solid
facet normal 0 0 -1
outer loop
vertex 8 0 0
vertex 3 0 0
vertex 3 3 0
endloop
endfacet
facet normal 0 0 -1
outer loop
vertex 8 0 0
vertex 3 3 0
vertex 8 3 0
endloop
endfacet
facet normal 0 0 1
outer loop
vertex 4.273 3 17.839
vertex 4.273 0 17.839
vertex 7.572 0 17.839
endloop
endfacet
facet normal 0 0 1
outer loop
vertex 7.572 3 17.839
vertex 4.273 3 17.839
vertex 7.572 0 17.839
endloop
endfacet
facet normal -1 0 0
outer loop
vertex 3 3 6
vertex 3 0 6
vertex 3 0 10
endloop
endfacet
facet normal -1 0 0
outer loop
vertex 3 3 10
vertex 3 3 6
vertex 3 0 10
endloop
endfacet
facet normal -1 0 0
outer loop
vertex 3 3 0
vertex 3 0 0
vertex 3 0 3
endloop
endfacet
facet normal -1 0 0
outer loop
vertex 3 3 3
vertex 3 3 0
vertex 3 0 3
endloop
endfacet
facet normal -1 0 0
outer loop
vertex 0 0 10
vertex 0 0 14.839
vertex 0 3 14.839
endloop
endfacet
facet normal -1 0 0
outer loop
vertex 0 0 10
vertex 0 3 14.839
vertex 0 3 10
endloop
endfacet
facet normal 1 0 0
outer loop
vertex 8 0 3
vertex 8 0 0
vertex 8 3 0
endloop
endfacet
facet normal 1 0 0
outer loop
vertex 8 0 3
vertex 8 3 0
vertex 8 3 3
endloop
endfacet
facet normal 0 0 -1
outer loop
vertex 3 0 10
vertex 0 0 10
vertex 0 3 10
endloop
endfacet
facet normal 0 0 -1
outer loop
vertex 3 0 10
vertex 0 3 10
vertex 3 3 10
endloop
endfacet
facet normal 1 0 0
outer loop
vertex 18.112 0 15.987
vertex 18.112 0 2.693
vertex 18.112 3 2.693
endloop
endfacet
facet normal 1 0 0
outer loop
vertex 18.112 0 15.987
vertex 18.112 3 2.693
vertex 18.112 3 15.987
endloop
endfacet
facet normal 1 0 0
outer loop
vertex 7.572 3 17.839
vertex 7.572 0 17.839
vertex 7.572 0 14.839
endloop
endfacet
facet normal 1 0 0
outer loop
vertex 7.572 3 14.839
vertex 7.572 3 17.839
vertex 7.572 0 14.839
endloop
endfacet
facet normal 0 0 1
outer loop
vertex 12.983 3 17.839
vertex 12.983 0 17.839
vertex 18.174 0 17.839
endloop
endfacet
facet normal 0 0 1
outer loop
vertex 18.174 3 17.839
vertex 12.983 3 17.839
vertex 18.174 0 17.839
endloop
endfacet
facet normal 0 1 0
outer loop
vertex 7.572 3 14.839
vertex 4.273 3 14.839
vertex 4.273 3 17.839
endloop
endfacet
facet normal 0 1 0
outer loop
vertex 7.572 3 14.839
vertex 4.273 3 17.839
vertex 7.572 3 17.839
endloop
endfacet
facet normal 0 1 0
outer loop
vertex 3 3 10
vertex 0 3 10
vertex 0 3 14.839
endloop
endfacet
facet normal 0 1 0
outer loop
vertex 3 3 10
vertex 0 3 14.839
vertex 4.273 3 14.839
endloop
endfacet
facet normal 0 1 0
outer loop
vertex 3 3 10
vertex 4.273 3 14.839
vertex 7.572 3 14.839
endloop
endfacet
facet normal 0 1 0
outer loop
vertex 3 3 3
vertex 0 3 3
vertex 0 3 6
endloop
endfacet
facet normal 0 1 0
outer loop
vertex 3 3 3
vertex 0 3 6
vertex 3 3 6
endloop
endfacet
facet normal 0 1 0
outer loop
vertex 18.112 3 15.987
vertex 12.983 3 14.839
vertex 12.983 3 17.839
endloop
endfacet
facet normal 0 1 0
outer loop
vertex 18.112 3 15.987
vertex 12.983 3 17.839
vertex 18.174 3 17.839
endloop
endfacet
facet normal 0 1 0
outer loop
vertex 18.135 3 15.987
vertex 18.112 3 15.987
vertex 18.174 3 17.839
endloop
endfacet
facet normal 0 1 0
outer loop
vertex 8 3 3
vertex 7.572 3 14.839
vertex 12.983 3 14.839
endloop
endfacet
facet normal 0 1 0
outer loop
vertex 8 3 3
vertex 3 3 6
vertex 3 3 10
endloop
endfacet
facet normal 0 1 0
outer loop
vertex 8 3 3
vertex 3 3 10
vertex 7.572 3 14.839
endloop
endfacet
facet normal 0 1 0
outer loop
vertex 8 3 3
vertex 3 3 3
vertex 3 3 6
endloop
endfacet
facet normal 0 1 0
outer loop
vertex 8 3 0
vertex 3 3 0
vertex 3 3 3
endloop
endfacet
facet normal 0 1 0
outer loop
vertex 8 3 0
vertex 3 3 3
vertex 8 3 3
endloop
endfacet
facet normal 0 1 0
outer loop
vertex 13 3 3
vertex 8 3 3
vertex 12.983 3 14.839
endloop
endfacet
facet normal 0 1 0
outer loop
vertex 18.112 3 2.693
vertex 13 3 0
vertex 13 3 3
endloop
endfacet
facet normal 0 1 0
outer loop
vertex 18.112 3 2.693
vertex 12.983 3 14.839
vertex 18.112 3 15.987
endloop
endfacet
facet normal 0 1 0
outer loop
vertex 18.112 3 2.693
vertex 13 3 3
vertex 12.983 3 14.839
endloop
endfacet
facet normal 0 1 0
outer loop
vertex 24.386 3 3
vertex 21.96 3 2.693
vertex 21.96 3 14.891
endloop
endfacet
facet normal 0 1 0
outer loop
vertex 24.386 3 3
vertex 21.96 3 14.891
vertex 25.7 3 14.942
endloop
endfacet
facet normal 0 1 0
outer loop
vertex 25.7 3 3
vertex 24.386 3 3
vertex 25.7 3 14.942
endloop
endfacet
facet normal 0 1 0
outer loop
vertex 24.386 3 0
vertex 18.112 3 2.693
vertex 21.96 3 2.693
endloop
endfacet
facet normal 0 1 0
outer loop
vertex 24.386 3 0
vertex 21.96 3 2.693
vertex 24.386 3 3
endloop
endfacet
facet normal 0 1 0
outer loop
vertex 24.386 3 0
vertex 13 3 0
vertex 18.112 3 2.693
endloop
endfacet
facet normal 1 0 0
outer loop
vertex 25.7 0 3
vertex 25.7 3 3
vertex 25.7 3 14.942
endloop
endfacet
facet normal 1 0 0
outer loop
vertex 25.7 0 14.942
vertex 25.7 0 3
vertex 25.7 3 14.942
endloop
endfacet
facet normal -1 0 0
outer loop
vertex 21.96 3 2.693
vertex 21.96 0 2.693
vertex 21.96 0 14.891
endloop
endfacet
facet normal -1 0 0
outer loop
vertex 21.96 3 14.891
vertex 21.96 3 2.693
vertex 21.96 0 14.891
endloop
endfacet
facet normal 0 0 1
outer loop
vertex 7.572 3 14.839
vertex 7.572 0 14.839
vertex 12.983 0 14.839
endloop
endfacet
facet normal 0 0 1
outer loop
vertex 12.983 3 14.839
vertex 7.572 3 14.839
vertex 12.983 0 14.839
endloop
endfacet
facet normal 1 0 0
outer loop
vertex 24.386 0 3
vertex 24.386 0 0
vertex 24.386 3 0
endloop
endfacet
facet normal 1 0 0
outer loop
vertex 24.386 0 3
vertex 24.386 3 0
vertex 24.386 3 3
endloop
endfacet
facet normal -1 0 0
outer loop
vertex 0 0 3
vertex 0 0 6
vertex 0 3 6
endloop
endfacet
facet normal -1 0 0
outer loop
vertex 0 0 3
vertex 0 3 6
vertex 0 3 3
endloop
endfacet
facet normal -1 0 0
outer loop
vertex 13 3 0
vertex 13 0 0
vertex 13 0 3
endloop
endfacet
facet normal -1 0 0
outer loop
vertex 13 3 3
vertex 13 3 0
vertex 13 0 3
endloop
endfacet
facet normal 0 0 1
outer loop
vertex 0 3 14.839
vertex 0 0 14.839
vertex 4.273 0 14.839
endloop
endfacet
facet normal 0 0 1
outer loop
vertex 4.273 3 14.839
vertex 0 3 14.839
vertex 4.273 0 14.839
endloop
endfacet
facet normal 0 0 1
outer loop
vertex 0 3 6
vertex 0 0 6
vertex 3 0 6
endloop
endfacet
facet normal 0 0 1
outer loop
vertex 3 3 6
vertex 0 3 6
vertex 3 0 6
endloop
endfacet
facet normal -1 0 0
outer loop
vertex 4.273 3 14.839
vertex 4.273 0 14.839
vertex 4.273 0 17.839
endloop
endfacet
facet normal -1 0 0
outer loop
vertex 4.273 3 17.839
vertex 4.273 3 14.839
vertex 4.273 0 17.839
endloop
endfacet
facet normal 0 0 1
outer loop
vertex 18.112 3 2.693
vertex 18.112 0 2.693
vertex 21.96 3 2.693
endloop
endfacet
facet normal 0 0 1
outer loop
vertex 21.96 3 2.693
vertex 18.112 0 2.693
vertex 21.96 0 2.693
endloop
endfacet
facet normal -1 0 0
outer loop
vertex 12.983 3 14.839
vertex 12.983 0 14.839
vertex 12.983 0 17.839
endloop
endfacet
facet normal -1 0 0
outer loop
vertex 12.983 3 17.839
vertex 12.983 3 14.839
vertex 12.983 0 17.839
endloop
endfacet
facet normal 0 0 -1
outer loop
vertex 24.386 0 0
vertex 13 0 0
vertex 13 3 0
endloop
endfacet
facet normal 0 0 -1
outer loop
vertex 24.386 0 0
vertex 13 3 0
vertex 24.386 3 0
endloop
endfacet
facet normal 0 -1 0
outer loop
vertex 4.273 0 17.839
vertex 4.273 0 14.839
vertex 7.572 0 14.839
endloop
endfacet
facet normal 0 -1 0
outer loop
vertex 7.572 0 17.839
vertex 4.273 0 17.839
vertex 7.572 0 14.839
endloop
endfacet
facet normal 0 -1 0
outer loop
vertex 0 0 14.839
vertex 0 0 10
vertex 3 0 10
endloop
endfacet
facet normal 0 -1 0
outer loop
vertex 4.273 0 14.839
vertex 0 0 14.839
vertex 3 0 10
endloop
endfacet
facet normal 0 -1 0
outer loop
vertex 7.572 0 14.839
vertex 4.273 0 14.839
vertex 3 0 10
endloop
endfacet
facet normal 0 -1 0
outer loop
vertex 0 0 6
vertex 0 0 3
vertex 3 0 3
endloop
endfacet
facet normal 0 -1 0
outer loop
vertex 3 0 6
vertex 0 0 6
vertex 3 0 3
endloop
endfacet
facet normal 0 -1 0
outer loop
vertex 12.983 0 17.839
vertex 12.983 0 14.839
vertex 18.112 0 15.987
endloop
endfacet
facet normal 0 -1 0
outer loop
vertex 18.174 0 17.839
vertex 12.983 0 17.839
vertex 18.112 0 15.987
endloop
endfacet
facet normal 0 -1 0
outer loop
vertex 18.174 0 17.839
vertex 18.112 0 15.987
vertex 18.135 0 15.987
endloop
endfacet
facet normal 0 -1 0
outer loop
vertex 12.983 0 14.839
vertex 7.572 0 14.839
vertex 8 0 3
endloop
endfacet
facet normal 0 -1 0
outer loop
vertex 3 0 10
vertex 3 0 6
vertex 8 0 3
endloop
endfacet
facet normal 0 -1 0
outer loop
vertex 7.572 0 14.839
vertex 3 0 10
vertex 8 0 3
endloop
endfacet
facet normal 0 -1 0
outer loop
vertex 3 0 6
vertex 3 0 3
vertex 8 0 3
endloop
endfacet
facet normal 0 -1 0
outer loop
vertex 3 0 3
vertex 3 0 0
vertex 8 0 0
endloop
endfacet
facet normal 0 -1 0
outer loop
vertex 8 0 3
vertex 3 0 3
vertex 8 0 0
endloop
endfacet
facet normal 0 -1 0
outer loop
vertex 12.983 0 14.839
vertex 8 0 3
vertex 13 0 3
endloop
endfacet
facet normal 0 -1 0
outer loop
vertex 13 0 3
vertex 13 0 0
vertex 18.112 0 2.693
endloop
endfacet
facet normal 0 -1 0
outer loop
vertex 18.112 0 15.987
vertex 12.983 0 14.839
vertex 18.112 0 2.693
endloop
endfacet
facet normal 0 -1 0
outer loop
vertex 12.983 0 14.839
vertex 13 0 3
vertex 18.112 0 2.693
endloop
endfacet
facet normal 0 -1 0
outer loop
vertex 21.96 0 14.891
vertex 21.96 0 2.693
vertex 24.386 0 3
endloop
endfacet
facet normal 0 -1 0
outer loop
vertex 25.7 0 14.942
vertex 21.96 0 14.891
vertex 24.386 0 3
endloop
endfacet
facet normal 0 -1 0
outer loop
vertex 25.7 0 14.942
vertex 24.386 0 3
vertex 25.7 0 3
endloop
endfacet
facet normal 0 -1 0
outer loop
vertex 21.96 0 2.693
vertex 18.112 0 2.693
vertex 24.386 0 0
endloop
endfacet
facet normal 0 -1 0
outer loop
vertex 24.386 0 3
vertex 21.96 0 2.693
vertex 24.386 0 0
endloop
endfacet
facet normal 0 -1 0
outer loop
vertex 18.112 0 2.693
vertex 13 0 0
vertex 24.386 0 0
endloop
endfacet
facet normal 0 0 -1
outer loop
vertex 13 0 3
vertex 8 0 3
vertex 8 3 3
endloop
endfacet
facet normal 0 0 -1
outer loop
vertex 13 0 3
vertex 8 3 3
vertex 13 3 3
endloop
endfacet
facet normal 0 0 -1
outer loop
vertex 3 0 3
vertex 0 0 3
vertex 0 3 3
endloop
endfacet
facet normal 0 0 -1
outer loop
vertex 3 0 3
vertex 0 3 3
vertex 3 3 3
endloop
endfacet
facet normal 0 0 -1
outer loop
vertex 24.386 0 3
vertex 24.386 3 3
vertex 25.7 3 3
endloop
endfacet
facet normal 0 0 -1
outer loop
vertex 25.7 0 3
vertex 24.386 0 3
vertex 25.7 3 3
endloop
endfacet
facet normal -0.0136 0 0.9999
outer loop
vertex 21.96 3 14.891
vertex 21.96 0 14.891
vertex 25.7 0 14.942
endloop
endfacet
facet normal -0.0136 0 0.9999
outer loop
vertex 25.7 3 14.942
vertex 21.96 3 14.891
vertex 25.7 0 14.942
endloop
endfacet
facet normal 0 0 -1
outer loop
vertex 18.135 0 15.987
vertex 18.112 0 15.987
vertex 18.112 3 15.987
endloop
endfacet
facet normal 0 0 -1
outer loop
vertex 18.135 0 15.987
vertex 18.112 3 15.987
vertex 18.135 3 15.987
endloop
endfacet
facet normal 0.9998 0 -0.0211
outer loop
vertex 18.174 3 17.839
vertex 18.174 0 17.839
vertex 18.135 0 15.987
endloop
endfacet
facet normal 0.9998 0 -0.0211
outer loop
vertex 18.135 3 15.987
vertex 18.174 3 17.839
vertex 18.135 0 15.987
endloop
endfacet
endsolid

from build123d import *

# Parameters (mm, degrees)
SKETCH1_W           = 30
SKETCH1_H           = 30
BOSS_EXTRUDE1_DEPTH = 3
SKETCH2_W           = 5
SKETCH2_H           = 3
SKETCH2_W_2         = 1.313790547
SKETCH2_W_3         = 3
SKETCH2_H_2         = 4
CUT_EXTRUDE1_DEPTH  = 3
SKETCH3_W           = 3.847981768
SKETCH3_H           = 13.294575909
CUT_EXTRUDE2_DEPTH  = 3
CUT_EXTRUDE3_DEPTH  = 3
CUT_EXTRUDE4_DEPTH  = 10


with BuildPart() as part:
    # Sketch1 → Boss-Extrude1 (new body)
    with BuildSketch(Plane(origin=(0, 0, 0), x_dir=(1, 0, 0), z_dir=(0, 1, 0))):
        with Locations((15, -15)):
            Rectangle(SKETCH1_W, SKETCH1_H)
    extrude(amount=BOSS_EXTRUDE1_DEPTH)

    # Sketch2 → Cut-Extrude1 (cut)
    with BuildSketch(Plane.XZ):
        with Locations((10.5, 1.5)):
            Rectangle(SKETCH2_W, SKETCH2_H)
        with Locations((25.043104727, 1.5)):
            Rectangle(SKETCH2_W_2, SKETCH2_H)
        with Locations((1.5, 1.5)):
            Rectangle(SKETCH2_W_3, SKETCH2_H)
        with Locations((1.5, 8)):
            Rectangle(SKETCH2_W_3, SKETCH2_H_2)
    extrude(amount=-CUT_EXTRUDE1_DEPTH, mode=Mode.SUBTRACT)

    # Sketch3 → Cut-Extrude2 (cut)
    with BuildSketch(Plane.XZ):
        with Locations((20.035652011, 9.340199914)):
            Rectangle(SKETCH3_W, SKETCH3_H)
    extrude(amount=-CUT_EXTRUDE2_DEPTH, mode=Mode.SUBTRACT)

    # Sketch4 → Cut-Extrude3 (cut)
    with BuildSketch(Plane.XZ):
        Polygon((0, 14.83898954), (4.273286448, 14.83898954), (4.273286448, 17.83898954), (7.572046642, 17.83898954), (7.572046642, 14.83898954), (12.983097177, 14.83898954), (12.983097177, 17.83898954), (18.173549861, 17.83898954), (18.111661127, 14.83898954), (30, 15), (30, 36.64216365), (-3.662569557, 36.64216365), (-3.662569557, 14.83898954), align=None)
    extrude(amount=-CUT_EXTRUDE3_DEPTH, mode=Mode.SUBTRACT)

    # Sketch6 → Cut-Extrude4 (cut)
    with BuildSketch(Plane(origin=(0, 3, 0), x_dir=(1, 0, 0), z_dir=(0, 1, 0))):
        Polygon((25.7, 0), (25.7, -20.065163227), (34.530029549, -19.489635477), (33.156944601, 1.576908509), (28.640882237, 2.839466423), align=None)
    extrude(amount=-CUT_EXTRUDE4_DEPTH, mode=Mode.SUBTRACT)


solid = part.part
